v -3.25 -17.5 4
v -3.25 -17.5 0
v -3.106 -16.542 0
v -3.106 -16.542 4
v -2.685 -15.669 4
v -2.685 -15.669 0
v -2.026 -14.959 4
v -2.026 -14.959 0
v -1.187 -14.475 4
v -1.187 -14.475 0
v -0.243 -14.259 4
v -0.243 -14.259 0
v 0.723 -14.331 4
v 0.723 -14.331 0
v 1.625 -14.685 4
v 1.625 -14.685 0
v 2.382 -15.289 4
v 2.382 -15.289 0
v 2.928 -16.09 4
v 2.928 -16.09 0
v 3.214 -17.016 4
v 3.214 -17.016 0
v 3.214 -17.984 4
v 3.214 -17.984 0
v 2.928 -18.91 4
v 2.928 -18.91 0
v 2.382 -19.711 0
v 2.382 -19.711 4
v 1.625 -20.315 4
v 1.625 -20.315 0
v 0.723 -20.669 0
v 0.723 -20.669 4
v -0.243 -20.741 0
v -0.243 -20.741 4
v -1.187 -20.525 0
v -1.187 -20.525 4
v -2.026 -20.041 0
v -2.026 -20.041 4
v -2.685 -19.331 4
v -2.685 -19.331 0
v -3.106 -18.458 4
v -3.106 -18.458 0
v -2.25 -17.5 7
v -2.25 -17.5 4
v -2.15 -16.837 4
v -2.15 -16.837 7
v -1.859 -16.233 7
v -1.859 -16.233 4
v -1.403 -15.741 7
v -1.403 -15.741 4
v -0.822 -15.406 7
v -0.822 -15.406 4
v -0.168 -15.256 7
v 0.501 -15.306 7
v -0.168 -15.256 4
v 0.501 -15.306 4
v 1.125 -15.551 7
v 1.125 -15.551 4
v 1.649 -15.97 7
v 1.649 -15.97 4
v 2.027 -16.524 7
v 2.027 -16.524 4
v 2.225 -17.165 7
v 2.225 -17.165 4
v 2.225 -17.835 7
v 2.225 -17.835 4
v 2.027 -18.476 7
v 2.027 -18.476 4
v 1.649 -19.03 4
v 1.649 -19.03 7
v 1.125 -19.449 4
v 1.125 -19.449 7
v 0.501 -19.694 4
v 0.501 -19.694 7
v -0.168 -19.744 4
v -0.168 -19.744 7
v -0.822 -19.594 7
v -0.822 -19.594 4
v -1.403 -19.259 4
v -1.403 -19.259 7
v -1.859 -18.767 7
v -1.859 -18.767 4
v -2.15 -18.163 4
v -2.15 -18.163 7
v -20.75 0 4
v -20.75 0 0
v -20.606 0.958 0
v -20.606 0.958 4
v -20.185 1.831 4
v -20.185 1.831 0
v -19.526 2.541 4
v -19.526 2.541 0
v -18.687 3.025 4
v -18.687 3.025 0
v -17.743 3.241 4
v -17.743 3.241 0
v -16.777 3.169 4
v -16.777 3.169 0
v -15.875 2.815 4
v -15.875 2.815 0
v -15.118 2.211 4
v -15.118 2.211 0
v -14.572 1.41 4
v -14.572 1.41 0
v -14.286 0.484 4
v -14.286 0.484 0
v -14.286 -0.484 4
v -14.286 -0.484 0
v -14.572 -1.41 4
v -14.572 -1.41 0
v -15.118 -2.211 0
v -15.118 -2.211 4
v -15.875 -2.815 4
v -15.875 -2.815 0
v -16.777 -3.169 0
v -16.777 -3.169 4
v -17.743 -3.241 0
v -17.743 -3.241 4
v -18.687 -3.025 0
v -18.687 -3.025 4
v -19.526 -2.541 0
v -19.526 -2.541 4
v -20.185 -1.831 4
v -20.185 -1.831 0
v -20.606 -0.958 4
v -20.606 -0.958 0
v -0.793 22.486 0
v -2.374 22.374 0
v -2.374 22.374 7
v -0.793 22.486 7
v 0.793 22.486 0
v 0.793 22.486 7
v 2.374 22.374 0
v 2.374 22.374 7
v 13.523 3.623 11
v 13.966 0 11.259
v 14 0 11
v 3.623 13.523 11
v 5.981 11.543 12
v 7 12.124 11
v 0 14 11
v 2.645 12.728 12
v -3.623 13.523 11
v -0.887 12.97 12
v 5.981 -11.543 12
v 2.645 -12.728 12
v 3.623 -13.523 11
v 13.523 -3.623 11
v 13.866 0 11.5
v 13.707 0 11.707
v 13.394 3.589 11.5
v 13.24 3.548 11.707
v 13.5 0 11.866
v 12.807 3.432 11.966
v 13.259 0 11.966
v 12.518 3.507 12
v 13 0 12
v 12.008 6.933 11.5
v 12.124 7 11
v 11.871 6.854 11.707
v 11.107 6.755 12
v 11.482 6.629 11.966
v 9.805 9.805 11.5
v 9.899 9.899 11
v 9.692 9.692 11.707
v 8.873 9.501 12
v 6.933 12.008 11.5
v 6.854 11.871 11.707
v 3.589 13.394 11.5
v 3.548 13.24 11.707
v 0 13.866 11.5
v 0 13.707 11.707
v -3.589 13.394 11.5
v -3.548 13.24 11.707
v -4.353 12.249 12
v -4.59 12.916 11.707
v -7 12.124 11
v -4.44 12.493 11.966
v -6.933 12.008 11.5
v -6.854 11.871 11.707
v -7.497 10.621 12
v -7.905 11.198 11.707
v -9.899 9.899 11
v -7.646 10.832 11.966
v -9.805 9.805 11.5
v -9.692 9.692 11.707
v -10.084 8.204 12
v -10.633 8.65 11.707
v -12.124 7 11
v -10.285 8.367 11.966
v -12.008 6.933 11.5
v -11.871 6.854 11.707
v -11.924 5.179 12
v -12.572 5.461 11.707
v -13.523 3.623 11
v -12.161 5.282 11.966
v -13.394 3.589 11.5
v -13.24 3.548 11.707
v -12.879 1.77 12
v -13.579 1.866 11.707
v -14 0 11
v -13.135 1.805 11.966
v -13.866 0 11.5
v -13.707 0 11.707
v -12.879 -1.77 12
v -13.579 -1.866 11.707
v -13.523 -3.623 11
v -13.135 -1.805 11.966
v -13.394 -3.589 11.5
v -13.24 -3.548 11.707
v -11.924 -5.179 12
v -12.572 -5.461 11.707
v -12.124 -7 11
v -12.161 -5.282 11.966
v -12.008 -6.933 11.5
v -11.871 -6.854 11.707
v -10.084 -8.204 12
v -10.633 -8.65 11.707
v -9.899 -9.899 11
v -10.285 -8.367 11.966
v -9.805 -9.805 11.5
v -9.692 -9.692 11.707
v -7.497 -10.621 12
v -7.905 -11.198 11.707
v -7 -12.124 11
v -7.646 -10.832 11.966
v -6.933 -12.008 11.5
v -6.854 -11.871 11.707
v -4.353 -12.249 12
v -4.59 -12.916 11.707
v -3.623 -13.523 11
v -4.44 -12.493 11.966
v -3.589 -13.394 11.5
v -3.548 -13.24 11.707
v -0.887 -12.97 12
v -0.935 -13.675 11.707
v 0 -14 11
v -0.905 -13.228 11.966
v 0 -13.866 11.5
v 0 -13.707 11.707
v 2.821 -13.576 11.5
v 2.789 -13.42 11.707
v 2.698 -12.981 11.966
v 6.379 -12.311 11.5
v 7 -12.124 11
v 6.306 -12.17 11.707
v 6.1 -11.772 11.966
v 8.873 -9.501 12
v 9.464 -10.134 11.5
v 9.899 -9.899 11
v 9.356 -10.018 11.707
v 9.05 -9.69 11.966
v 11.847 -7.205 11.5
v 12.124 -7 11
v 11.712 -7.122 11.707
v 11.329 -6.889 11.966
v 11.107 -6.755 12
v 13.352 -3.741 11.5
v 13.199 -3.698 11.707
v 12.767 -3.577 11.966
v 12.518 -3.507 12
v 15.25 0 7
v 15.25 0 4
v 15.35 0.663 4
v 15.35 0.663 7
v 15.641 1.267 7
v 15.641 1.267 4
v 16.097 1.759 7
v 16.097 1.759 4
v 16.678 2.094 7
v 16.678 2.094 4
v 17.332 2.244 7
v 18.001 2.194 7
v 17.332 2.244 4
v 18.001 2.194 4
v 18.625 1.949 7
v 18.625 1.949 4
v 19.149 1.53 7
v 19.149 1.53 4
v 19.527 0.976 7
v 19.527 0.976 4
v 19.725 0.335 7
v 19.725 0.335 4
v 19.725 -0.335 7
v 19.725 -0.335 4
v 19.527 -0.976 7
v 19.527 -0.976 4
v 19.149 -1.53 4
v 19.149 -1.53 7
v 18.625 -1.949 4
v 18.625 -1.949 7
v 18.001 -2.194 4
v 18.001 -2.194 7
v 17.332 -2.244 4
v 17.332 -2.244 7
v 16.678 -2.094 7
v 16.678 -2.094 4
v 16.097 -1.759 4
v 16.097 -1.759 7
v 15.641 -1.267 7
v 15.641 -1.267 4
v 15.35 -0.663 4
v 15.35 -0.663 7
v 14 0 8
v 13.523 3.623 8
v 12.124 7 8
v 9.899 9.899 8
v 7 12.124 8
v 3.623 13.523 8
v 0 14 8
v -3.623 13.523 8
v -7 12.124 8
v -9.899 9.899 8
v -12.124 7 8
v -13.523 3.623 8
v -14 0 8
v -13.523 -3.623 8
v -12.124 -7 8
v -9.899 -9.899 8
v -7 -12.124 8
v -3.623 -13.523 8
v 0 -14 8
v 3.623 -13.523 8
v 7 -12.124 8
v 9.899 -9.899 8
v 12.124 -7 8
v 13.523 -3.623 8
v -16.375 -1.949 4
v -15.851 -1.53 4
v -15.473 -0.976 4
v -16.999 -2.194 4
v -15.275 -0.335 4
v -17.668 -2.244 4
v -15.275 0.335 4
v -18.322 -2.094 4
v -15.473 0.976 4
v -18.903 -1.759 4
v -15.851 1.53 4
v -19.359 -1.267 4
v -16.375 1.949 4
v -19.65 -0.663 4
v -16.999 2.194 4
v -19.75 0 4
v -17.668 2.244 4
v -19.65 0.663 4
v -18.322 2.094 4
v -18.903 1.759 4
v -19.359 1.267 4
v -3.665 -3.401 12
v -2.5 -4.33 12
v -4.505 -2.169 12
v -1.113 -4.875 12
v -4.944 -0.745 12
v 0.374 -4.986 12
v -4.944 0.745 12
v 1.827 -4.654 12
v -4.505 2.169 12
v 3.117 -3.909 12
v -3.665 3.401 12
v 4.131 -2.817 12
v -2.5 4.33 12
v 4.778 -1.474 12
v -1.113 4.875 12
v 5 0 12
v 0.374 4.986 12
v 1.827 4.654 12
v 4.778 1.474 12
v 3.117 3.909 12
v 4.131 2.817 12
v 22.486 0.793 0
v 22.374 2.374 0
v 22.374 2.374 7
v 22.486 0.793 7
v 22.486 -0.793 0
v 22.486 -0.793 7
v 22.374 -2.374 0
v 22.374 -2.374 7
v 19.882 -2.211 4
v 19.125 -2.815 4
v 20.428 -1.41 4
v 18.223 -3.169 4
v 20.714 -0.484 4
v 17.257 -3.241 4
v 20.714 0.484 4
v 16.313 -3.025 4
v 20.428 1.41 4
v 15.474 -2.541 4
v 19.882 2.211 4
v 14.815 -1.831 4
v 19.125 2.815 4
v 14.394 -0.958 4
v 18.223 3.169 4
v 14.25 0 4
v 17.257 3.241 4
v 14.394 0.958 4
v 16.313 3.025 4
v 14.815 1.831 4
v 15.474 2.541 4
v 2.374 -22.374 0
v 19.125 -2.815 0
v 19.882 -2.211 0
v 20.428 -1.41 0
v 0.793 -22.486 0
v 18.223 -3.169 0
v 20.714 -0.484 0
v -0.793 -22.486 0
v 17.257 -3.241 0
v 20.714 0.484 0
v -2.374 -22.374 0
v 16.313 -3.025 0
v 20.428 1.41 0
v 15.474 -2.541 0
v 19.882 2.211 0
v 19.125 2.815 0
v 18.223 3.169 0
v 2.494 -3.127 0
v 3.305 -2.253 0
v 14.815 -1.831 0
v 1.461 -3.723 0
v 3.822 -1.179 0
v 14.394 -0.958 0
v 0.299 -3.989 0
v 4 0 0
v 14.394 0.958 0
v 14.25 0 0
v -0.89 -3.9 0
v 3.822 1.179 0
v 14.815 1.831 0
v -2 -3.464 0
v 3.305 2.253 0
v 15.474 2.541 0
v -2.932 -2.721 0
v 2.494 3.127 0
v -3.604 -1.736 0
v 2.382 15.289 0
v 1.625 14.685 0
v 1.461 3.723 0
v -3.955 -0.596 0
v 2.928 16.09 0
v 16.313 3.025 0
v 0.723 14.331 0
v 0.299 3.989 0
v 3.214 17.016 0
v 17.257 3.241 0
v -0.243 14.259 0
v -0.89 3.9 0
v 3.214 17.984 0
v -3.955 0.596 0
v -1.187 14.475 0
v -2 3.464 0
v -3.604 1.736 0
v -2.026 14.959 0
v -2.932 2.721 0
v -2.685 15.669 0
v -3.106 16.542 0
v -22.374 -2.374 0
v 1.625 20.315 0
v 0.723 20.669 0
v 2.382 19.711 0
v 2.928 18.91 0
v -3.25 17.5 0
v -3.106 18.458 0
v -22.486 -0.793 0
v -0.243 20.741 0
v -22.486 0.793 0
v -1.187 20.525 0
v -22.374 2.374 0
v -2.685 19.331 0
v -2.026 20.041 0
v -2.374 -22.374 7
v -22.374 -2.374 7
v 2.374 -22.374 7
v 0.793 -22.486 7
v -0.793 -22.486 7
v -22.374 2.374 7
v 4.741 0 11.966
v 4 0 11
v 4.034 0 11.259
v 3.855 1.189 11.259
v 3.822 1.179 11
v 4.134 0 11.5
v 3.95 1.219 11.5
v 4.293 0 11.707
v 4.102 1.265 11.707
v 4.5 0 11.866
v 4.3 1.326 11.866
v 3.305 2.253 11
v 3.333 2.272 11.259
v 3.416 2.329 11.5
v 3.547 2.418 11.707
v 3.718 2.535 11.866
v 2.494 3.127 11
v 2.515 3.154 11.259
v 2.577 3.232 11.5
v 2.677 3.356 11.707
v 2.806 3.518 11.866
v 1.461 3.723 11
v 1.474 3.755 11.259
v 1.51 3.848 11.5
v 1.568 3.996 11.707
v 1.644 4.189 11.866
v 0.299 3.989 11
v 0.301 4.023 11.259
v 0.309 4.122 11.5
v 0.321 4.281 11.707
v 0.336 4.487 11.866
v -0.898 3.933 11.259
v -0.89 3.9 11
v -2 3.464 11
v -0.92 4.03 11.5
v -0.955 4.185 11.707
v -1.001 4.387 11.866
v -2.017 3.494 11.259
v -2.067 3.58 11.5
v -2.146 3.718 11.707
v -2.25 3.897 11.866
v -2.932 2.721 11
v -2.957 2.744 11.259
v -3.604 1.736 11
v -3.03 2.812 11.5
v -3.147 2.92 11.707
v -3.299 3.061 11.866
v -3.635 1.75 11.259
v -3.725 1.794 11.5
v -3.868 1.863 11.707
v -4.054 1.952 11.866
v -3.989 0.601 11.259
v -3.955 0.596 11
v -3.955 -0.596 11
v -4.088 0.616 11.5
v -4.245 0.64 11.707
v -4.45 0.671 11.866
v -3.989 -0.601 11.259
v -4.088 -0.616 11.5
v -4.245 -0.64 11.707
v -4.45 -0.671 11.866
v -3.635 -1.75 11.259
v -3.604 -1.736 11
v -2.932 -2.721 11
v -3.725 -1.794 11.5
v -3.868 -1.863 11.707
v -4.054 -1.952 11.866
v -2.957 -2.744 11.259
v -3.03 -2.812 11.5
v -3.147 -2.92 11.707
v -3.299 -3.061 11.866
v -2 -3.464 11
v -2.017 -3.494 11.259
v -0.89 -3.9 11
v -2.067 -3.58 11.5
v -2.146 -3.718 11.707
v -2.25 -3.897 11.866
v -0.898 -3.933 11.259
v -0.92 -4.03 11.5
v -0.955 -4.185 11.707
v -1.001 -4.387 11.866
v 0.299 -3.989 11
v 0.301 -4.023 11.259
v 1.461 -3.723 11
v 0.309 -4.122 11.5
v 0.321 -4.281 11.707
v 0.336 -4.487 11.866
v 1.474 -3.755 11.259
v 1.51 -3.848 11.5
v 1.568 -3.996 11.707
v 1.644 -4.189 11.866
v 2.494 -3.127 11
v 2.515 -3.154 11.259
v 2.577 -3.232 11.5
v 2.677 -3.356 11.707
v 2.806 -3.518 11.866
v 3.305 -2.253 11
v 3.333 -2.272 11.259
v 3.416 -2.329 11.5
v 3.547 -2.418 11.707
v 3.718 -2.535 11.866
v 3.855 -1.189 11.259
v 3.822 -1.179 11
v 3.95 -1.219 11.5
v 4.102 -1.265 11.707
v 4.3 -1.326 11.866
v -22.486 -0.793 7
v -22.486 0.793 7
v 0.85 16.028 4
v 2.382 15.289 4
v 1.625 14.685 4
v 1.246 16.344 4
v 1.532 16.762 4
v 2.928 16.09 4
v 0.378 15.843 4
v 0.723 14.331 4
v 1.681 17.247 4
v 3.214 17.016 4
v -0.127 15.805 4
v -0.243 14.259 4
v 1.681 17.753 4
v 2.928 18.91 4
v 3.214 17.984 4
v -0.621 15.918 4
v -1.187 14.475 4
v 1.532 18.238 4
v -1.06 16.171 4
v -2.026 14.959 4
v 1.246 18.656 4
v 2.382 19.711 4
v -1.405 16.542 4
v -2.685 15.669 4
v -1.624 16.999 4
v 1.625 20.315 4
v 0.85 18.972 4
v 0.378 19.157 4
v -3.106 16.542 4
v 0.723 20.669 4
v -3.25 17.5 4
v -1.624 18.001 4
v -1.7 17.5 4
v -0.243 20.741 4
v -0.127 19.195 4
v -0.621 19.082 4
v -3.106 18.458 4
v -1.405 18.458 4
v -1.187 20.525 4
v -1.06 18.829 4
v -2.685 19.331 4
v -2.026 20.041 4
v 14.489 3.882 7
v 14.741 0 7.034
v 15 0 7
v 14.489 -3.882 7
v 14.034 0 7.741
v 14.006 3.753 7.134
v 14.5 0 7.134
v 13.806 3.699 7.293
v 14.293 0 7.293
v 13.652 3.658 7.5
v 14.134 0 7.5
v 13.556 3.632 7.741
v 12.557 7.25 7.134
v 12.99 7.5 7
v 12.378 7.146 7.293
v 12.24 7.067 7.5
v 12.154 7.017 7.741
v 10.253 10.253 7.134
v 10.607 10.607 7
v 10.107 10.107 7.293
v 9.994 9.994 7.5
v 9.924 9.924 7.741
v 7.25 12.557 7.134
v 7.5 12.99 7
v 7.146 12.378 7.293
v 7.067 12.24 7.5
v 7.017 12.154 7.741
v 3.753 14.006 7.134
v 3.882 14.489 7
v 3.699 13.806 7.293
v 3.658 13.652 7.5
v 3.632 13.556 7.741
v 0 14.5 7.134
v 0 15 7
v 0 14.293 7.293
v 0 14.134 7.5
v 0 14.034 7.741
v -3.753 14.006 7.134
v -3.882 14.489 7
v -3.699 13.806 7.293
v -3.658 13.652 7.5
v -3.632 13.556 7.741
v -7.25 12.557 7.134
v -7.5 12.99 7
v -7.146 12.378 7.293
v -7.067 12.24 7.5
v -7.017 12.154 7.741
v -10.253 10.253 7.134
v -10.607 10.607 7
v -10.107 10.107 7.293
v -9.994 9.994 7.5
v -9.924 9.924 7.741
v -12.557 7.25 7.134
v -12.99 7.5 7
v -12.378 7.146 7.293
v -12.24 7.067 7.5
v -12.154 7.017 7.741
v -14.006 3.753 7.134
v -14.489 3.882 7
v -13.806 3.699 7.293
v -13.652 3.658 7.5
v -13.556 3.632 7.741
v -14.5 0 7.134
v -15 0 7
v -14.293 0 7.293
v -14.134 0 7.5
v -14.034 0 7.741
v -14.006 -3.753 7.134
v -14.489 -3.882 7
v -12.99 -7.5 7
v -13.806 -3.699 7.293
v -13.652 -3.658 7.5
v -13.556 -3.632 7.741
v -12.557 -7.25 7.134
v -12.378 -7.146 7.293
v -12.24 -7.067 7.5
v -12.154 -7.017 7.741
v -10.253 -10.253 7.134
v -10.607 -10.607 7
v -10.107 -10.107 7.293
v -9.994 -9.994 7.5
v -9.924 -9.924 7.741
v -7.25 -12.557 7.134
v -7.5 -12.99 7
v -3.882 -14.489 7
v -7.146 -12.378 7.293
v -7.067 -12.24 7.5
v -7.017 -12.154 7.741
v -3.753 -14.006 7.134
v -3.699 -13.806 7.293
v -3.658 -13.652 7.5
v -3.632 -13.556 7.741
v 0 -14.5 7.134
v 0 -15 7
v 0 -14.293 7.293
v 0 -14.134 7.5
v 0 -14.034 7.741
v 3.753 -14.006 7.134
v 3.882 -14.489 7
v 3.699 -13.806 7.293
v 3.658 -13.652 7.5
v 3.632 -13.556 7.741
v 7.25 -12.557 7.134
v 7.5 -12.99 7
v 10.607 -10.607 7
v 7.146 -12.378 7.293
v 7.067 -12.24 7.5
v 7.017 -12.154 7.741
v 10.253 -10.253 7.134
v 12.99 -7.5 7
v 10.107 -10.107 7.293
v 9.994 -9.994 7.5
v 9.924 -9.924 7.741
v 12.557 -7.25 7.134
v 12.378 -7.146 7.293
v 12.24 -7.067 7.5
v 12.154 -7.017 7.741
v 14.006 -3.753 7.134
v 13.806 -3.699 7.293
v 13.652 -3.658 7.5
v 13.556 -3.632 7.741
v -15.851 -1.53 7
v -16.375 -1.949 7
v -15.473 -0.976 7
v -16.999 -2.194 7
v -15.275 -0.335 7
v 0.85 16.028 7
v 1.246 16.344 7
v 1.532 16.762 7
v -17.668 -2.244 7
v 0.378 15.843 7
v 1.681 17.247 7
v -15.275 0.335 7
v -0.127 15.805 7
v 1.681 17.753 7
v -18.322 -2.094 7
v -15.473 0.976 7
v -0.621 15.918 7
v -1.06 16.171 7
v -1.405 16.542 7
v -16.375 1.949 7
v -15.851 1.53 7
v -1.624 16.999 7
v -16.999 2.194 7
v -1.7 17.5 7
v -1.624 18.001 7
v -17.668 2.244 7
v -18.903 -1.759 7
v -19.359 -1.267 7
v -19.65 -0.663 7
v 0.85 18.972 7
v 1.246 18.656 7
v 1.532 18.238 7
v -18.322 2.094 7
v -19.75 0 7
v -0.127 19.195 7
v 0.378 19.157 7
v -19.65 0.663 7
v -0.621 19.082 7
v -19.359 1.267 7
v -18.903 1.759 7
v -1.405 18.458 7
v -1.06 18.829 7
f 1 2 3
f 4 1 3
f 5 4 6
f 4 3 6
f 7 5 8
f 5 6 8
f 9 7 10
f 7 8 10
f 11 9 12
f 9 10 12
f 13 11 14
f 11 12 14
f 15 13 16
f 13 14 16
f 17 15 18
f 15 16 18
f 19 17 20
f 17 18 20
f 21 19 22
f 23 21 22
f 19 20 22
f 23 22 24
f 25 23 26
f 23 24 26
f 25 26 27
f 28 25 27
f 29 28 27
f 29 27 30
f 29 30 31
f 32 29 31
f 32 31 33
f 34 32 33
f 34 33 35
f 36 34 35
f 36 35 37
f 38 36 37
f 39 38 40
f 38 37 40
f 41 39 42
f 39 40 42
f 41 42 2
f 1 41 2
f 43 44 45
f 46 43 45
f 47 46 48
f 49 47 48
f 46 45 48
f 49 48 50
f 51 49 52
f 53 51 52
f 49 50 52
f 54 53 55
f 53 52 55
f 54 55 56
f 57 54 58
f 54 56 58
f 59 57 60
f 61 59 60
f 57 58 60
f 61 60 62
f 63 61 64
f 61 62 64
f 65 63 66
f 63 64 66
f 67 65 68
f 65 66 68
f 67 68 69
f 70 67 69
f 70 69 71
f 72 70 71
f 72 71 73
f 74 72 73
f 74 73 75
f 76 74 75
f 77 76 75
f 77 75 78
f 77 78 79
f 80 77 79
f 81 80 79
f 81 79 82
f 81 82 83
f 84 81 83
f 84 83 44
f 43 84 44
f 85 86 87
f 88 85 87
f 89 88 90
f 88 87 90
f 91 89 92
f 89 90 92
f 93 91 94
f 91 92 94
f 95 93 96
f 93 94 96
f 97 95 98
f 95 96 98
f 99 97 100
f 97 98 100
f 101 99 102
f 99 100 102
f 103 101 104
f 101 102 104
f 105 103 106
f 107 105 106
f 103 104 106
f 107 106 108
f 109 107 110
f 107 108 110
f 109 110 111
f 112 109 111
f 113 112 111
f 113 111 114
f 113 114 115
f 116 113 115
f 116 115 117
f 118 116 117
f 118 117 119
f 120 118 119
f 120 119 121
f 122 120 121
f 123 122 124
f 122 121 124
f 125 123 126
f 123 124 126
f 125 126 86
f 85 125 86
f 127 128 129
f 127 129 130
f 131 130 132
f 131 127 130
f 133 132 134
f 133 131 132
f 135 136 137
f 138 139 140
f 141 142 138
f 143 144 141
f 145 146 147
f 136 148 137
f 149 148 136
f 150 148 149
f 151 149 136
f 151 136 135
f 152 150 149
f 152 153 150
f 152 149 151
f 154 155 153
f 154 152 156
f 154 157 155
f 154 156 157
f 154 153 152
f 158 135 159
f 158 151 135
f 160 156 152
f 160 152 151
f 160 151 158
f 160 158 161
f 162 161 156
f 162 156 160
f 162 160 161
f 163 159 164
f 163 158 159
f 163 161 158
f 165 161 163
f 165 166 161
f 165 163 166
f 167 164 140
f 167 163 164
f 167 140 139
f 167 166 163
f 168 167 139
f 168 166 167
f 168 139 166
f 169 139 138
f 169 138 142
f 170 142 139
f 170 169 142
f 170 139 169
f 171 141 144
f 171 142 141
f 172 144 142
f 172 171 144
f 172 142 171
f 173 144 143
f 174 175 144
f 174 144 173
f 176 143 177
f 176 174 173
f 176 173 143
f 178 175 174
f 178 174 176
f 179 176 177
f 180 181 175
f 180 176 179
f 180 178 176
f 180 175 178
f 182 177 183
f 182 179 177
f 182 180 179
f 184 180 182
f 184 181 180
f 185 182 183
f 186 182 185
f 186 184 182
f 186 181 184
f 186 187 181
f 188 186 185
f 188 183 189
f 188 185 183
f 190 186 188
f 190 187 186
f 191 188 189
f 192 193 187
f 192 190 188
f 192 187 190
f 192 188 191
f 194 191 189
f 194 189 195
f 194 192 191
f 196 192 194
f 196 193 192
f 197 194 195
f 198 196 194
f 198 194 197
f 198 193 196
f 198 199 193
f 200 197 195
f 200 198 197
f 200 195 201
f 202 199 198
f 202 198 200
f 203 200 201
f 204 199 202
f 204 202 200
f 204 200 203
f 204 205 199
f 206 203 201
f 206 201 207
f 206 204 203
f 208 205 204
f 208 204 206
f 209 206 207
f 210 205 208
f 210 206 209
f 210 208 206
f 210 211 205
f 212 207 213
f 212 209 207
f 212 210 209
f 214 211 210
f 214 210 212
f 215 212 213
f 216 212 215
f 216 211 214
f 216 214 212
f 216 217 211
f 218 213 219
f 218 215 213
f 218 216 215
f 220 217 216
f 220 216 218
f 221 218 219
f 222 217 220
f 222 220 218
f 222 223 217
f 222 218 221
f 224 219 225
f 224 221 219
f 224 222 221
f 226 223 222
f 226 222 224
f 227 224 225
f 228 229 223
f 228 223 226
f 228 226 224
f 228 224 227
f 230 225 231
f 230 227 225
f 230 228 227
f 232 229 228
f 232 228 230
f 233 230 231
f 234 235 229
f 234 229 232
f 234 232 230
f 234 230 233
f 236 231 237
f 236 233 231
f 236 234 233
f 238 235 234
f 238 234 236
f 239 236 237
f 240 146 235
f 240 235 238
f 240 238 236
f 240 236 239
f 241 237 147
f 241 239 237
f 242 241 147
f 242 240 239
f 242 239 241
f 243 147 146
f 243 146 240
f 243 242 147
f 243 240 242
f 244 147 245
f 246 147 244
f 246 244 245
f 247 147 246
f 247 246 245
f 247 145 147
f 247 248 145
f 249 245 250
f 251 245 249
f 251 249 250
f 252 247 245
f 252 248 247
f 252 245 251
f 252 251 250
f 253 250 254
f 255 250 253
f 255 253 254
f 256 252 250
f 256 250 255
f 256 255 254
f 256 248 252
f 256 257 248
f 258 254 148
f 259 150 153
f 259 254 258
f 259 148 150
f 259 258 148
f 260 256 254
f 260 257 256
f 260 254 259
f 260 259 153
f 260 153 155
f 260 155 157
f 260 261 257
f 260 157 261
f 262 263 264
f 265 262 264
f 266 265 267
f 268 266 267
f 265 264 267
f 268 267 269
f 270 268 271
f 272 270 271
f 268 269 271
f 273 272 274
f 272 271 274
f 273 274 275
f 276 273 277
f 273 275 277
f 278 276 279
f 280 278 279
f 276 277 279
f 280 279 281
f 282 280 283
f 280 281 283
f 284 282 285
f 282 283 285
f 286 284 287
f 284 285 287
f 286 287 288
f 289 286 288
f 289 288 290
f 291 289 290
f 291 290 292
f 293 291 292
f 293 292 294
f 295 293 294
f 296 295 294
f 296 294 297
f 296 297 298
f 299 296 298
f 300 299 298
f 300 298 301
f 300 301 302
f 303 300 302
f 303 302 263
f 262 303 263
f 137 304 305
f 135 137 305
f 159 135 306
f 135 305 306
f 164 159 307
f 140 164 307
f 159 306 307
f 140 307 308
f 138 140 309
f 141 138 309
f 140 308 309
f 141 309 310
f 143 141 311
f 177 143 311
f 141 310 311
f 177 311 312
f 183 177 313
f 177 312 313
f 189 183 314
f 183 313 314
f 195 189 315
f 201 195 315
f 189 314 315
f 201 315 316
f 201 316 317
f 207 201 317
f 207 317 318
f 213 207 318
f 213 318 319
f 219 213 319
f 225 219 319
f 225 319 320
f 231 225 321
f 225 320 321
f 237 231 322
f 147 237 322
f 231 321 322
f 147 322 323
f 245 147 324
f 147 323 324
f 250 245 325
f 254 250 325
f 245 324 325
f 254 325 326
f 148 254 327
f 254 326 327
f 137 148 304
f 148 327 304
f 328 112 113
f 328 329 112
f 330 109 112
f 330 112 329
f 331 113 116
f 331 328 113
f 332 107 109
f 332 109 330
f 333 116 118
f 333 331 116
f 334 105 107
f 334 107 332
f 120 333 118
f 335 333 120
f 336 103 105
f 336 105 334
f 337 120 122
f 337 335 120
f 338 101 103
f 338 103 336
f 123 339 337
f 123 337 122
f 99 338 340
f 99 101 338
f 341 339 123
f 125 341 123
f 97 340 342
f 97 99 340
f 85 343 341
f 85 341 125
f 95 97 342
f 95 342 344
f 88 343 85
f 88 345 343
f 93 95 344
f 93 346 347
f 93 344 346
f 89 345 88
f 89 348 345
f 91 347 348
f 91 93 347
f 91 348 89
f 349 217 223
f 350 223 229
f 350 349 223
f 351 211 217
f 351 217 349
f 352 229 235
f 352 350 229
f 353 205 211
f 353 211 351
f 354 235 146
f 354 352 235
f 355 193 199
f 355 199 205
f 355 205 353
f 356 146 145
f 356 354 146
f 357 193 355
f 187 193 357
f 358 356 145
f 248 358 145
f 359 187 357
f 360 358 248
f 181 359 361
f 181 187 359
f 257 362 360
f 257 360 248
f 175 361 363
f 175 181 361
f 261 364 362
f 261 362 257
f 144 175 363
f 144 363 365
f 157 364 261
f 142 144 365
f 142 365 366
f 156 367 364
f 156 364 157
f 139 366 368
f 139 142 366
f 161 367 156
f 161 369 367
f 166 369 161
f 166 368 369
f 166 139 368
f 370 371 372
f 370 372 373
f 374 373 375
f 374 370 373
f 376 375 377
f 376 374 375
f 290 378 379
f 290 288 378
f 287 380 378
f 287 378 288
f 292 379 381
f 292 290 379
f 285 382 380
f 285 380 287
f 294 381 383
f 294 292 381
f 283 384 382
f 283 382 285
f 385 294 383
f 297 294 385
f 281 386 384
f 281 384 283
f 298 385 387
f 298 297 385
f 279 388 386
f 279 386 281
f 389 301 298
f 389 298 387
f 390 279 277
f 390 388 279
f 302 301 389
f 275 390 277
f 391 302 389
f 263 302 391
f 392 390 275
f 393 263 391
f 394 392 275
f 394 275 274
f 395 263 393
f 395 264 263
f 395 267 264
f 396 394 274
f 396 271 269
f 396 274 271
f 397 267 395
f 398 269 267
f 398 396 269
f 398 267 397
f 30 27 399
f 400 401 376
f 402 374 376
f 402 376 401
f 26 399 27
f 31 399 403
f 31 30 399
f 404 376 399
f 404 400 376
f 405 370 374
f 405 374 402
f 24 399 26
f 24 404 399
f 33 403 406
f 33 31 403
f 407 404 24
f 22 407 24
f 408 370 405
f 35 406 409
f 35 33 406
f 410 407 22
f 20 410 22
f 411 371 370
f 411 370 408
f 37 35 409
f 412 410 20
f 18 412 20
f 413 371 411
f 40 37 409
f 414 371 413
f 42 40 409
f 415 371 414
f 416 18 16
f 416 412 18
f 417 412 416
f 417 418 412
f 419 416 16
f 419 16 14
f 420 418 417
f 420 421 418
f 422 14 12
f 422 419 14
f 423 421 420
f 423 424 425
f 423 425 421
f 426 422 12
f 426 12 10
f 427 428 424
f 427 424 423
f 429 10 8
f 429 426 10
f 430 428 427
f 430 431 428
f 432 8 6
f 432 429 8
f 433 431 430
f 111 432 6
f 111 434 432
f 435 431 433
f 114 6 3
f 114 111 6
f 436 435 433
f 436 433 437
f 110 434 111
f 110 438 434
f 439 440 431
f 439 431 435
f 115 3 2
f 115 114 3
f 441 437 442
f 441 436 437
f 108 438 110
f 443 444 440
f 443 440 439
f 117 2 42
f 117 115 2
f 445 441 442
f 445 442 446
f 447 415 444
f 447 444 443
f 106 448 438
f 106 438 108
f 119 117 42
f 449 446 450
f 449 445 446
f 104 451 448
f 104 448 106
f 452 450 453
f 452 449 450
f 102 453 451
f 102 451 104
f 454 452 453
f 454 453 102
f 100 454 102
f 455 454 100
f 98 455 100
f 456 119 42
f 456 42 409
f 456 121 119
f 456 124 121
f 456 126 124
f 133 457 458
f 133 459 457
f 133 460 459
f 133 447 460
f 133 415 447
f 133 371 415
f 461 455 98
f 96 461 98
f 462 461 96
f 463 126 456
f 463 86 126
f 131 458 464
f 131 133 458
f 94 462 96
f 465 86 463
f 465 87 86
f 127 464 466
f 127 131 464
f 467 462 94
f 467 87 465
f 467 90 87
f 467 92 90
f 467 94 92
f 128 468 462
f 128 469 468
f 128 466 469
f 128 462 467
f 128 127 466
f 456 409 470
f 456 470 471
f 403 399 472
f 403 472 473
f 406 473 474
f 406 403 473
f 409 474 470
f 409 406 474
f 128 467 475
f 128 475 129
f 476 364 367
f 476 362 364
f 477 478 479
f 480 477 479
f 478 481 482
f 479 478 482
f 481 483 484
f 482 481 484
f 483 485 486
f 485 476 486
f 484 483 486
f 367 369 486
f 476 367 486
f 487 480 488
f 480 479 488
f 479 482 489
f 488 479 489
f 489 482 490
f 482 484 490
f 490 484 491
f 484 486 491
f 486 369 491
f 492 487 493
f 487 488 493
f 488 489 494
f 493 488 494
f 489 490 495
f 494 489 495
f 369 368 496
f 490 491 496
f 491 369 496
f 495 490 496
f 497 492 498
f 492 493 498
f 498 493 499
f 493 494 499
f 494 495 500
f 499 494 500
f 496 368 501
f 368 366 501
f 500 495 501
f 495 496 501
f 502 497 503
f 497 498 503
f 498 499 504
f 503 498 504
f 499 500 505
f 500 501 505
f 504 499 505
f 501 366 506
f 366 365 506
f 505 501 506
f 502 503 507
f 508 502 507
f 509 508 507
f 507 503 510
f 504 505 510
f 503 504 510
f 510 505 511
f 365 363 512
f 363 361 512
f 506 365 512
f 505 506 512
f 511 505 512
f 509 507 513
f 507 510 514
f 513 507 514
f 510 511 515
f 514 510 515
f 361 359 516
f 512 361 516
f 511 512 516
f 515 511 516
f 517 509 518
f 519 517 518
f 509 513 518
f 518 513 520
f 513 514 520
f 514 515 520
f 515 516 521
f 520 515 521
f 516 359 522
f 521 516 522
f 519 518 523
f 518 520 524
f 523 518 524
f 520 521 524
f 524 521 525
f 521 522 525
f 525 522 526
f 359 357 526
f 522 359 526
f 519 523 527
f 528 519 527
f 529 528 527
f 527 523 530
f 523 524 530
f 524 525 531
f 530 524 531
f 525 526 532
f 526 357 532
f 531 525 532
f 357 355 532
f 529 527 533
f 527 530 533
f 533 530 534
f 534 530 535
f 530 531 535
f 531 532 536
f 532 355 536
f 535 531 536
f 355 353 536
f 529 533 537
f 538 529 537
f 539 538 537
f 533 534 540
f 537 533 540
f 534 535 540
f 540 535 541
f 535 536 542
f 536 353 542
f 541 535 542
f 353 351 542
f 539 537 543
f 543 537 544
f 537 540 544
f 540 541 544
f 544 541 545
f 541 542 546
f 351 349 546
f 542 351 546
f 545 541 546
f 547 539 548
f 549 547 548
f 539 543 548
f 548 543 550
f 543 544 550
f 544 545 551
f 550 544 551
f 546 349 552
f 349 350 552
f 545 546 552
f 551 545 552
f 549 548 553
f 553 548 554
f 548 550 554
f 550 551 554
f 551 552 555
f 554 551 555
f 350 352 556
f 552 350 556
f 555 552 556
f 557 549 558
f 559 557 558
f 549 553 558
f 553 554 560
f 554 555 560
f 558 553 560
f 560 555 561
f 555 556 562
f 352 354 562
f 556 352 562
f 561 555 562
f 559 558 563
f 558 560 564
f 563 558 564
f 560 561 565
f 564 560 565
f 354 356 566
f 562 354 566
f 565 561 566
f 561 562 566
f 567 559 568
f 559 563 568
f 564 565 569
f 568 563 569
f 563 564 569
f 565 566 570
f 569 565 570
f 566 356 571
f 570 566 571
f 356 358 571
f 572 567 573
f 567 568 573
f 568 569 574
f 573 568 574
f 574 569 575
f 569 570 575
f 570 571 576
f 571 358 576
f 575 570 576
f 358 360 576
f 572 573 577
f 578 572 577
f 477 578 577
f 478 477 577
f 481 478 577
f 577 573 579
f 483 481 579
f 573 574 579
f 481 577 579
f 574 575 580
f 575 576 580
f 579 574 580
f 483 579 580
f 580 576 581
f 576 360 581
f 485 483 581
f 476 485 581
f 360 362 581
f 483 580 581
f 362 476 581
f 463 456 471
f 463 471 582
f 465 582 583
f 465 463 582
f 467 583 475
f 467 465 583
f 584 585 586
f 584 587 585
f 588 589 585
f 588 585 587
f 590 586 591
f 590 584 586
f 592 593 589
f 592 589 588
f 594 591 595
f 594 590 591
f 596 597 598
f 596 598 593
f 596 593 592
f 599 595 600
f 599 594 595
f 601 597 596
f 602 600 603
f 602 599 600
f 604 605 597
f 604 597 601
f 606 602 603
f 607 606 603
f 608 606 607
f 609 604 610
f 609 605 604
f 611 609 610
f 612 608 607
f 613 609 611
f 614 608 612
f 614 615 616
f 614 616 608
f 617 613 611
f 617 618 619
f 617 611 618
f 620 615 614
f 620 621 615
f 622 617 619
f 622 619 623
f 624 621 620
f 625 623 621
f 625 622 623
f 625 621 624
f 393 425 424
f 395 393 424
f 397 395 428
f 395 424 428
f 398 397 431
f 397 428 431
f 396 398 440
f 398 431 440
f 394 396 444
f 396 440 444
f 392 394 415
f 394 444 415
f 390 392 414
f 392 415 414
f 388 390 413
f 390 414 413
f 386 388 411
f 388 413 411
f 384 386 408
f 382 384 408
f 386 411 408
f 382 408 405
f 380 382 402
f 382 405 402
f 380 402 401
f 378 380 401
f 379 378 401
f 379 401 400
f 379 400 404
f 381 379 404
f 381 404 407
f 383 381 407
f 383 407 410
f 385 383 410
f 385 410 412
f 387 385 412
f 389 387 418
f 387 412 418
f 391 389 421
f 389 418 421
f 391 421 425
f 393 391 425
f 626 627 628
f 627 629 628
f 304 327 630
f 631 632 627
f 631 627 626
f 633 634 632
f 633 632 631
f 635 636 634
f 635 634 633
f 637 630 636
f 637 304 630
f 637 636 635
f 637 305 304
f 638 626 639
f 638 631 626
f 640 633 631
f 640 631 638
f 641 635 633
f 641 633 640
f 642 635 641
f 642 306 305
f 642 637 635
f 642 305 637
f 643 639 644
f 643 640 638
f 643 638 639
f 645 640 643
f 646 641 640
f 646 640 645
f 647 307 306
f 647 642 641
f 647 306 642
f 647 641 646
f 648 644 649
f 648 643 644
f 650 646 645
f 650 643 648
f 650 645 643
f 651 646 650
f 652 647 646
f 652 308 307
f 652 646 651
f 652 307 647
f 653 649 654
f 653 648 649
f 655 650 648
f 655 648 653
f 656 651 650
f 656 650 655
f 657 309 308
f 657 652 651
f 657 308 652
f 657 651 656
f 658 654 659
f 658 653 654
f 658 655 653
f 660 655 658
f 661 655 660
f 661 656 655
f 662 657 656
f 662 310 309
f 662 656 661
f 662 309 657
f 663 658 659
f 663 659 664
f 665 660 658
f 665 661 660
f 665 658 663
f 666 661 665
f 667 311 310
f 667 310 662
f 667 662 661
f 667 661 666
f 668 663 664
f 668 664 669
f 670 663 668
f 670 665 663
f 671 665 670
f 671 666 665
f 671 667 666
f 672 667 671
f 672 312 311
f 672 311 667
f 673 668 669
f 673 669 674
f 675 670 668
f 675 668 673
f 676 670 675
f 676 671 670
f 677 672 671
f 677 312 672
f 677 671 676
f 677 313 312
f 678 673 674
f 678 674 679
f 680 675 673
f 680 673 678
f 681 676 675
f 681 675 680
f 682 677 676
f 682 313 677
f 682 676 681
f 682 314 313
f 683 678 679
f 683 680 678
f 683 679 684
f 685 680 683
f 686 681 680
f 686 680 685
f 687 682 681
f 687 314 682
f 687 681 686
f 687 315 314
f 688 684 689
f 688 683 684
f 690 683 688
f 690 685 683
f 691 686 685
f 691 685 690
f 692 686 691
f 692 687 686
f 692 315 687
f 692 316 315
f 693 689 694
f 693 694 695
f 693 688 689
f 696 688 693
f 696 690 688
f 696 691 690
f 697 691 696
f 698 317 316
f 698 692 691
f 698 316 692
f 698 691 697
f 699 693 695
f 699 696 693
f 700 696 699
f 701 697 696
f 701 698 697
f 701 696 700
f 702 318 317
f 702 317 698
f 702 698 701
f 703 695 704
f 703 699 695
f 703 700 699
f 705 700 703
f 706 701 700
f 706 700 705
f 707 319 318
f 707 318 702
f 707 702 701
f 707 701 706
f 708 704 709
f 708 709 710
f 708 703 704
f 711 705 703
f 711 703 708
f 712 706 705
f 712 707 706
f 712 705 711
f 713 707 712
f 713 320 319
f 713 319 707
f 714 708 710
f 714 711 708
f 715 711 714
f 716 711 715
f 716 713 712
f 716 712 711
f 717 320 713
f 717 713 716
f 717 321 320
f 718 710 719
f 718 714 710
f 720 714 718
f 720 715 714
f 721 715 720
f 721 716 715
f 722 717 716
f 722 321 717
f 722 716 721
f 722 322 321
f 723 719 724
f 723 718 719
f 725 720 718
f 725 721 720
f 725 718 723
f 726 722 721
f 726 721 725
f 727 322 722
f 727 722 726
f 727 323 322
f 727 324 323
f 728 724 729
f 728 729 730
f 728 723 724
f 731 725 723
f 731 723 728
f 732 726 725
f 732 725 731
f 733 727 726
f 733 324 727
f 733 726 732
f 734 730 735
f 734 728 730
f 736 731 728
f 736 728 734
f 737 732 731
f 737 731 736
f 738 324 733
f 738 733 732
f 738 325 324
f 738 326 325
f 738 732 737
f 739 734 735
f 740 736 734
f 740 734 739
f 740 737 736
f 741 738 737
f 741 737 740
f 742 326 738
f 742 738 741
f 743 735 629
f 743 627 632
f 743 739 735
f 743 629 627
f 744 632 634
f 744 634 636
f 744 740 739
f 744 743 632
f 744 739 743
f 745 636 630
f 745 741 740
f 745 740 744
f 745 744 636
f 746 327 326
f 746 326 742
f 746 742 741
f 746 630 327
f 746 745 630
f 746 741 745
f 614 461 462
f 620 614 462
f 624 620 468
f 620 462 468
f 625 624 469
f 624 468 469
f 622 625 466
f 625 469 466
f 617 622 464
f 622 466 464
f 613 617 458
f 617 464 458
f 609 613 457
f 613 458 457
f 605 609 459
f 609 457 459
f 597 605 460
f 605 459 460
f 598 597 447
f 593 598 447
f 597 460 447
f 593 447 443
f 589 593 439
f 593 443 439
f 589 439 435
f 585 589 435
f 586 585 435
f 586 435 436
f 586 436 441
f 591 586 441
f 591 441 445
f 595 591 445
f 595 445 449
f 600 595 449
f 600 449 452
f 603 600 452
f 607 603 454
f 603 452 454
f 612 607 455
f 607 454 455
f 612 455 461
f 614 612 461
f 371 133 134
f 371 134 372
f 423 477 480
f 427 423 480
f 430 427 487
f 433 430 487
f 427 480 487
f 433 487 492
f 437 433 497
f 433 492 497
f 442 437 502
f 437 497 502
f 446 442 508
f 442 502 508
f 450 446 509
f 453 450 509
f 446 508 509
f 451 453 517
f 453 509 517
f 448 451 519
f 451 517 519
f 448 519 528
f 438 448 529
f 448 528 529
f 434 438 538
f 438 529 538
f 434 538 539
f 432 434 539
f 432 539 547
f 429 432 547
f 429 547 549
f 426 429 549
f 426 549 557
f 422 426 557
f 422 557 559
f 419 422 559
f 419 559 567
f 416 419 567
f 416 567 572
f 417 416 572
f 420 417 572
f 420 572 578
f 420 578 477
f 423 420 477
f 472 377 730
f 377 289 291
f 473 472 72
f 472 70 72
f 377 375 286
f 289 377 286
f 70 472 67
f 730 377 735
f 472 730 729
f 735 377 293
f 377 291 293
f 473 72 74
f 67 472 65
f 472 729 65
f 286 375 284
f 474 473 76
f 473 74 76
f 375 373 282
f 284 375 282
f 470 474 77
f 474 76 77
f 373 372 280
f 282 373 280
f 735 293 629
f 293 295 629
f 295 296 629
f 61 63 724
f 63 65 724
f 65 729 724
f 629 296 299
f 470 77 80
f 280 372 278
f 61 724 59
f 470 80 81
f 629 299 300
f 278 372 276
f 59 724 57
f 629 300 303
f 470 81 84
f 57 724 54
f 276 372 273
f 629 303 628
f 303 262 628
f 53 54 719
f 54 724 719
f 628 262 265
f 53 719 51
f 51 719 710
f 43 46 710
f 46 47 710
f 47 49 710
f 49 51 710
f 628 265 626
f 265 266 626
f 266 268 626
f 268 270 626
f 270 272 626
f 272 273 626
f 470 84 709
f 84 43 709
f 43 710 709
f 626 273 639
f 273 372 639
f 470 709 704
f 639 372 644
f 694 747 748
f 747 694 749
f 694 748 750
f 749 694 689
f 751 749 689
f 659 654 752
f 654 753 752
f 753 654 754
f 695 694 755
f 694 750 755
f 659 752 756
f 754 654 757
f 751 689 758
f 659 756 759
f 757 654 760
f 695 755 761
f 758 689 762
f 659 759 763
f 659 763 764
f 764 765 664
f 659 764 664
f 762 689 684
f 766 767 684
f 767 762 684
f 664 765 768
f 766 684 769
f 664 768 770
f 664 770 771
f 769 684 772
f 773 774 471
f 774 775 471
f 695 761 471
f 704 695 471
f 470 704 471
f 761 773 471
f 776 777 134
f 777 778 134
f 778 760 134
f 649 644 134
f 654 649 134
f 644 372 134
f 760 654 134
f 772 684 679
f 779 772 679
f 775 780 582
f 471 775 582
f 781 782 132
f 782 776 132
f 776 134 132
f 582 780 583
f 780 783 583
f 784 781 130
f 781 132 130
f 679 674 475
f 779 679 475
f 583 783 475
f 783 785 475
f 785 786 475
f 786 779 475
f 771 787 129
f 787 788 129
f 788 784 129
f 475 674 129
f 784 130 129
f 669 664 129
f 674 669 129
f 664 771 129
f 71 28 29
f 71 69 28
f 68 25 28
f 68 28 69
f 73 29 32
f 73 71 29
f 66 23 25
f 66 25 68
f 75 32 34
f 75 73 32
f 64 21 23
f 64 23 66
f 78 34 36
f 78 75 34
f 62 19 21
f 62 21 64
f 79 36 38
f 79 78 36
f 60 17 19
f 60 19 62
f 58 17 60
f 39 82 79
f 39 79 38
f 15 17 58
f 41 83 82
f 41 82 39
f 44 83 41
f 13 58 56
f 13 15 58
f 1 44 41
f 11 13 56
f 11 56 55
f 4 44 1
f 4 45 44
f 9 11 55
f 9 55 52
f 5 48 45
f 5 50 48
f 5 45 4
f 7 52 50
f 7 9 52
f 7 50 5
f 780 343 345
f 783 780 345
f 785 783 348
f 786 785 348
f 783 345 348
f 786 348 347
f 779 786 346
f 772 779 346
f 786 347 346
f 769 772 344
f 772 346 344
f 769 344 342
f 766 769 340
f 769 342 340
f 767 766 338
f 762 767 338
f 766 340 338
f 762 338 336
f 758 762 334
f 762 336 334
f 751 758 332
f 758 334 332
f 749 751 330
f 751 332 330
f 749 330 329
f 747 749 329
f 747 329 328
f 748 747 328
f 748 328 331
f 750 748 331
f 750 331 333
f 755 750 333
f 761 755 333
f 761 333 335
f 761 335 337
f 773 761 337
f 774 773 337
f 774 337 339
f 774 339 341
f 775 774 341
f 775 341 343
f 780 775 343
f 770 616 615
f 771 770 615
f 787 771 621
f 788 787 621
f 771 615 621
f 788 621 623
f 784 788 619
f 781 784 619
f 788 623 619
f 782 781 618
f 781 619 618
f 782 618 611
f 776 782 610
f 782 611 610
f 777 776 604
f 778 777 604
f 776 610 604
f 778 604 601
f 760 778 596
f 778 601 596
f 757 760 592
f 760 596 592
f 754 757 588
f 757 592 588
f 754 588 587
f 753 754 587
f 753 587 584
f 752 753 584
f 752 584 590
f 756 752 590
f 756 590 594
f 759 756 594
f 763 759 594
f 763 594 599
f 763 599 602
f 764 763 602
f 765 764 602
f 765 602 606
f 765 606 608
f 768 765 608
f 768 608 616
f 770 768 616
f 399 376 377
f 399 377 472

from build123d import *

# Parameters (mm, degrees)
BOSS_EXTRUDE1_DEPTH = 7
SKETCH2_R           = 3.25
CUT_EXTRUDE1_DEPTH  = 4
SKETCH3_R           = 1.7
SKETCH3_R_2         = 2.25
CUT_EXTRUDE2_DEPTH  = 4
SKETCH4_R           = 14
BOSS_EXTRUDE2_DEPTH = 5
SKETCH5_R           = 4
CUT_EXTRUDE3_DEPTH  = 15
FILLET3_R           = 1


with BuildPart() as part:
    # Sketch1 → Boss-Extrude1 (new body)
    with BuildSketch(Plane.XY):
        with BuildLine():
            Line((-12.374368671, -12.374368671), (-22.374368671, -2.374368671))
            ThreePointArc((-22.374368671, -2.374368671), (-22.5, 0), (-22.374368671, 2.374368671))
            Line((-22.374368671, 2.374368671), (-12.374368671, 12.374368671))
            Line((-12.374368671, 12.374368671), (-2.374368671, 22.374368671))
            ThreePointArc((-2.374368671, 22.374368671), (0, 22.5), (2.374368671, 22.374368671))
            Line((2.374368671, 22.374368671), (12.374368671, 12.374368671))
            Line((12.374368671, 12.374368671), (22.374368671, 2.374368671))
            ThreePointArc((22.374368671, 2.374368671), (22.5, 0), (22.374368671, -2.374368671))
            Line((22.374368671, -2.374368671), (12.374368671, -12.374368671))
            Line((12.374368671, -12.374368671), (2.374368671, -22.374368671))
            ThreePointArc((2.374368671, -22.374368671), (0, -22.5), (-2.374368671, -22.374368671))
            Line((-2.374368671, -22.374368671), (-12.374368671, -12.374368671))
        make_face()
    extrude(amount=BOSS_EXTRUDE1_DEPTH)

    # Sketch2 → Cut-Extrude1 (cut)
    with BuildSketch(Plane(origin=(0, 0, 0), x_dir=(-1, 0, 0), z_dir=(0, 0, -1))):
        with Locations((0, 17.5)):
            Circle(SKETCH2_R)
        with Locations((-17.5, 0)):
            Circle(SKETCH2_R)
        with Locations((0, -17.5)):
            Circle(SKETCH2_R)
        with Locations((17.5, 0)):
            Circle(SKETCH2_R)
    extrude(amount=-CUT_EXTRUDE1_DEPTH, mode=Mode.SUBTRACT)

    # Sketch3 → Cut-Extrude2 (cut)
    with BuildSketch(Plane(origin=(0, 0, 4), x_dir=(-1, 0, 0), z_dir=(0, 0, -1))):
        with Locations((0, 17.5)):
            Circle(SKETCH3_R)
        with Locations((-17.5, 0)):
            Circle(SKETCH3_R_2)
        with Locations((17.5, 0)):
            Circle(SKETCH3_R_2)
        with Locations((0, -17.5)):
            Circle(SKETCH3_R_2)
    extrude(amount=-CUT_EXTRUDE2_DEPTH, mode=Mode.SUBTRACT)

    # Sketch4 → Boss-Extrude2 (add)
    with BuildSketch(Plane.XY.offset(7)):
        Circle(SKETCH4_R)
    extrude(amount=BOSS_EXTRUDE2_DEPTH)

    # Sketch5 → Cut-Extrude3 (cut)
    with BuildSketch(Plane.XY.offset(12)):
        Circle(SKETCH5_R)
    extrude(amount=-CUT_EXTRUDE3_DEPTH, mode=Mode.SUBTRACT)

    # Fillet3
    fillet3_edges = [part.edges().sort_by_distance(p)[0] for p in [
        (-14, 0, 7),
        (-14, 0, 12),
        (-4, 0, 12),
    ]]
    fillet(fillet3_edges, radius=FILLET3_R)


solid = part.part
